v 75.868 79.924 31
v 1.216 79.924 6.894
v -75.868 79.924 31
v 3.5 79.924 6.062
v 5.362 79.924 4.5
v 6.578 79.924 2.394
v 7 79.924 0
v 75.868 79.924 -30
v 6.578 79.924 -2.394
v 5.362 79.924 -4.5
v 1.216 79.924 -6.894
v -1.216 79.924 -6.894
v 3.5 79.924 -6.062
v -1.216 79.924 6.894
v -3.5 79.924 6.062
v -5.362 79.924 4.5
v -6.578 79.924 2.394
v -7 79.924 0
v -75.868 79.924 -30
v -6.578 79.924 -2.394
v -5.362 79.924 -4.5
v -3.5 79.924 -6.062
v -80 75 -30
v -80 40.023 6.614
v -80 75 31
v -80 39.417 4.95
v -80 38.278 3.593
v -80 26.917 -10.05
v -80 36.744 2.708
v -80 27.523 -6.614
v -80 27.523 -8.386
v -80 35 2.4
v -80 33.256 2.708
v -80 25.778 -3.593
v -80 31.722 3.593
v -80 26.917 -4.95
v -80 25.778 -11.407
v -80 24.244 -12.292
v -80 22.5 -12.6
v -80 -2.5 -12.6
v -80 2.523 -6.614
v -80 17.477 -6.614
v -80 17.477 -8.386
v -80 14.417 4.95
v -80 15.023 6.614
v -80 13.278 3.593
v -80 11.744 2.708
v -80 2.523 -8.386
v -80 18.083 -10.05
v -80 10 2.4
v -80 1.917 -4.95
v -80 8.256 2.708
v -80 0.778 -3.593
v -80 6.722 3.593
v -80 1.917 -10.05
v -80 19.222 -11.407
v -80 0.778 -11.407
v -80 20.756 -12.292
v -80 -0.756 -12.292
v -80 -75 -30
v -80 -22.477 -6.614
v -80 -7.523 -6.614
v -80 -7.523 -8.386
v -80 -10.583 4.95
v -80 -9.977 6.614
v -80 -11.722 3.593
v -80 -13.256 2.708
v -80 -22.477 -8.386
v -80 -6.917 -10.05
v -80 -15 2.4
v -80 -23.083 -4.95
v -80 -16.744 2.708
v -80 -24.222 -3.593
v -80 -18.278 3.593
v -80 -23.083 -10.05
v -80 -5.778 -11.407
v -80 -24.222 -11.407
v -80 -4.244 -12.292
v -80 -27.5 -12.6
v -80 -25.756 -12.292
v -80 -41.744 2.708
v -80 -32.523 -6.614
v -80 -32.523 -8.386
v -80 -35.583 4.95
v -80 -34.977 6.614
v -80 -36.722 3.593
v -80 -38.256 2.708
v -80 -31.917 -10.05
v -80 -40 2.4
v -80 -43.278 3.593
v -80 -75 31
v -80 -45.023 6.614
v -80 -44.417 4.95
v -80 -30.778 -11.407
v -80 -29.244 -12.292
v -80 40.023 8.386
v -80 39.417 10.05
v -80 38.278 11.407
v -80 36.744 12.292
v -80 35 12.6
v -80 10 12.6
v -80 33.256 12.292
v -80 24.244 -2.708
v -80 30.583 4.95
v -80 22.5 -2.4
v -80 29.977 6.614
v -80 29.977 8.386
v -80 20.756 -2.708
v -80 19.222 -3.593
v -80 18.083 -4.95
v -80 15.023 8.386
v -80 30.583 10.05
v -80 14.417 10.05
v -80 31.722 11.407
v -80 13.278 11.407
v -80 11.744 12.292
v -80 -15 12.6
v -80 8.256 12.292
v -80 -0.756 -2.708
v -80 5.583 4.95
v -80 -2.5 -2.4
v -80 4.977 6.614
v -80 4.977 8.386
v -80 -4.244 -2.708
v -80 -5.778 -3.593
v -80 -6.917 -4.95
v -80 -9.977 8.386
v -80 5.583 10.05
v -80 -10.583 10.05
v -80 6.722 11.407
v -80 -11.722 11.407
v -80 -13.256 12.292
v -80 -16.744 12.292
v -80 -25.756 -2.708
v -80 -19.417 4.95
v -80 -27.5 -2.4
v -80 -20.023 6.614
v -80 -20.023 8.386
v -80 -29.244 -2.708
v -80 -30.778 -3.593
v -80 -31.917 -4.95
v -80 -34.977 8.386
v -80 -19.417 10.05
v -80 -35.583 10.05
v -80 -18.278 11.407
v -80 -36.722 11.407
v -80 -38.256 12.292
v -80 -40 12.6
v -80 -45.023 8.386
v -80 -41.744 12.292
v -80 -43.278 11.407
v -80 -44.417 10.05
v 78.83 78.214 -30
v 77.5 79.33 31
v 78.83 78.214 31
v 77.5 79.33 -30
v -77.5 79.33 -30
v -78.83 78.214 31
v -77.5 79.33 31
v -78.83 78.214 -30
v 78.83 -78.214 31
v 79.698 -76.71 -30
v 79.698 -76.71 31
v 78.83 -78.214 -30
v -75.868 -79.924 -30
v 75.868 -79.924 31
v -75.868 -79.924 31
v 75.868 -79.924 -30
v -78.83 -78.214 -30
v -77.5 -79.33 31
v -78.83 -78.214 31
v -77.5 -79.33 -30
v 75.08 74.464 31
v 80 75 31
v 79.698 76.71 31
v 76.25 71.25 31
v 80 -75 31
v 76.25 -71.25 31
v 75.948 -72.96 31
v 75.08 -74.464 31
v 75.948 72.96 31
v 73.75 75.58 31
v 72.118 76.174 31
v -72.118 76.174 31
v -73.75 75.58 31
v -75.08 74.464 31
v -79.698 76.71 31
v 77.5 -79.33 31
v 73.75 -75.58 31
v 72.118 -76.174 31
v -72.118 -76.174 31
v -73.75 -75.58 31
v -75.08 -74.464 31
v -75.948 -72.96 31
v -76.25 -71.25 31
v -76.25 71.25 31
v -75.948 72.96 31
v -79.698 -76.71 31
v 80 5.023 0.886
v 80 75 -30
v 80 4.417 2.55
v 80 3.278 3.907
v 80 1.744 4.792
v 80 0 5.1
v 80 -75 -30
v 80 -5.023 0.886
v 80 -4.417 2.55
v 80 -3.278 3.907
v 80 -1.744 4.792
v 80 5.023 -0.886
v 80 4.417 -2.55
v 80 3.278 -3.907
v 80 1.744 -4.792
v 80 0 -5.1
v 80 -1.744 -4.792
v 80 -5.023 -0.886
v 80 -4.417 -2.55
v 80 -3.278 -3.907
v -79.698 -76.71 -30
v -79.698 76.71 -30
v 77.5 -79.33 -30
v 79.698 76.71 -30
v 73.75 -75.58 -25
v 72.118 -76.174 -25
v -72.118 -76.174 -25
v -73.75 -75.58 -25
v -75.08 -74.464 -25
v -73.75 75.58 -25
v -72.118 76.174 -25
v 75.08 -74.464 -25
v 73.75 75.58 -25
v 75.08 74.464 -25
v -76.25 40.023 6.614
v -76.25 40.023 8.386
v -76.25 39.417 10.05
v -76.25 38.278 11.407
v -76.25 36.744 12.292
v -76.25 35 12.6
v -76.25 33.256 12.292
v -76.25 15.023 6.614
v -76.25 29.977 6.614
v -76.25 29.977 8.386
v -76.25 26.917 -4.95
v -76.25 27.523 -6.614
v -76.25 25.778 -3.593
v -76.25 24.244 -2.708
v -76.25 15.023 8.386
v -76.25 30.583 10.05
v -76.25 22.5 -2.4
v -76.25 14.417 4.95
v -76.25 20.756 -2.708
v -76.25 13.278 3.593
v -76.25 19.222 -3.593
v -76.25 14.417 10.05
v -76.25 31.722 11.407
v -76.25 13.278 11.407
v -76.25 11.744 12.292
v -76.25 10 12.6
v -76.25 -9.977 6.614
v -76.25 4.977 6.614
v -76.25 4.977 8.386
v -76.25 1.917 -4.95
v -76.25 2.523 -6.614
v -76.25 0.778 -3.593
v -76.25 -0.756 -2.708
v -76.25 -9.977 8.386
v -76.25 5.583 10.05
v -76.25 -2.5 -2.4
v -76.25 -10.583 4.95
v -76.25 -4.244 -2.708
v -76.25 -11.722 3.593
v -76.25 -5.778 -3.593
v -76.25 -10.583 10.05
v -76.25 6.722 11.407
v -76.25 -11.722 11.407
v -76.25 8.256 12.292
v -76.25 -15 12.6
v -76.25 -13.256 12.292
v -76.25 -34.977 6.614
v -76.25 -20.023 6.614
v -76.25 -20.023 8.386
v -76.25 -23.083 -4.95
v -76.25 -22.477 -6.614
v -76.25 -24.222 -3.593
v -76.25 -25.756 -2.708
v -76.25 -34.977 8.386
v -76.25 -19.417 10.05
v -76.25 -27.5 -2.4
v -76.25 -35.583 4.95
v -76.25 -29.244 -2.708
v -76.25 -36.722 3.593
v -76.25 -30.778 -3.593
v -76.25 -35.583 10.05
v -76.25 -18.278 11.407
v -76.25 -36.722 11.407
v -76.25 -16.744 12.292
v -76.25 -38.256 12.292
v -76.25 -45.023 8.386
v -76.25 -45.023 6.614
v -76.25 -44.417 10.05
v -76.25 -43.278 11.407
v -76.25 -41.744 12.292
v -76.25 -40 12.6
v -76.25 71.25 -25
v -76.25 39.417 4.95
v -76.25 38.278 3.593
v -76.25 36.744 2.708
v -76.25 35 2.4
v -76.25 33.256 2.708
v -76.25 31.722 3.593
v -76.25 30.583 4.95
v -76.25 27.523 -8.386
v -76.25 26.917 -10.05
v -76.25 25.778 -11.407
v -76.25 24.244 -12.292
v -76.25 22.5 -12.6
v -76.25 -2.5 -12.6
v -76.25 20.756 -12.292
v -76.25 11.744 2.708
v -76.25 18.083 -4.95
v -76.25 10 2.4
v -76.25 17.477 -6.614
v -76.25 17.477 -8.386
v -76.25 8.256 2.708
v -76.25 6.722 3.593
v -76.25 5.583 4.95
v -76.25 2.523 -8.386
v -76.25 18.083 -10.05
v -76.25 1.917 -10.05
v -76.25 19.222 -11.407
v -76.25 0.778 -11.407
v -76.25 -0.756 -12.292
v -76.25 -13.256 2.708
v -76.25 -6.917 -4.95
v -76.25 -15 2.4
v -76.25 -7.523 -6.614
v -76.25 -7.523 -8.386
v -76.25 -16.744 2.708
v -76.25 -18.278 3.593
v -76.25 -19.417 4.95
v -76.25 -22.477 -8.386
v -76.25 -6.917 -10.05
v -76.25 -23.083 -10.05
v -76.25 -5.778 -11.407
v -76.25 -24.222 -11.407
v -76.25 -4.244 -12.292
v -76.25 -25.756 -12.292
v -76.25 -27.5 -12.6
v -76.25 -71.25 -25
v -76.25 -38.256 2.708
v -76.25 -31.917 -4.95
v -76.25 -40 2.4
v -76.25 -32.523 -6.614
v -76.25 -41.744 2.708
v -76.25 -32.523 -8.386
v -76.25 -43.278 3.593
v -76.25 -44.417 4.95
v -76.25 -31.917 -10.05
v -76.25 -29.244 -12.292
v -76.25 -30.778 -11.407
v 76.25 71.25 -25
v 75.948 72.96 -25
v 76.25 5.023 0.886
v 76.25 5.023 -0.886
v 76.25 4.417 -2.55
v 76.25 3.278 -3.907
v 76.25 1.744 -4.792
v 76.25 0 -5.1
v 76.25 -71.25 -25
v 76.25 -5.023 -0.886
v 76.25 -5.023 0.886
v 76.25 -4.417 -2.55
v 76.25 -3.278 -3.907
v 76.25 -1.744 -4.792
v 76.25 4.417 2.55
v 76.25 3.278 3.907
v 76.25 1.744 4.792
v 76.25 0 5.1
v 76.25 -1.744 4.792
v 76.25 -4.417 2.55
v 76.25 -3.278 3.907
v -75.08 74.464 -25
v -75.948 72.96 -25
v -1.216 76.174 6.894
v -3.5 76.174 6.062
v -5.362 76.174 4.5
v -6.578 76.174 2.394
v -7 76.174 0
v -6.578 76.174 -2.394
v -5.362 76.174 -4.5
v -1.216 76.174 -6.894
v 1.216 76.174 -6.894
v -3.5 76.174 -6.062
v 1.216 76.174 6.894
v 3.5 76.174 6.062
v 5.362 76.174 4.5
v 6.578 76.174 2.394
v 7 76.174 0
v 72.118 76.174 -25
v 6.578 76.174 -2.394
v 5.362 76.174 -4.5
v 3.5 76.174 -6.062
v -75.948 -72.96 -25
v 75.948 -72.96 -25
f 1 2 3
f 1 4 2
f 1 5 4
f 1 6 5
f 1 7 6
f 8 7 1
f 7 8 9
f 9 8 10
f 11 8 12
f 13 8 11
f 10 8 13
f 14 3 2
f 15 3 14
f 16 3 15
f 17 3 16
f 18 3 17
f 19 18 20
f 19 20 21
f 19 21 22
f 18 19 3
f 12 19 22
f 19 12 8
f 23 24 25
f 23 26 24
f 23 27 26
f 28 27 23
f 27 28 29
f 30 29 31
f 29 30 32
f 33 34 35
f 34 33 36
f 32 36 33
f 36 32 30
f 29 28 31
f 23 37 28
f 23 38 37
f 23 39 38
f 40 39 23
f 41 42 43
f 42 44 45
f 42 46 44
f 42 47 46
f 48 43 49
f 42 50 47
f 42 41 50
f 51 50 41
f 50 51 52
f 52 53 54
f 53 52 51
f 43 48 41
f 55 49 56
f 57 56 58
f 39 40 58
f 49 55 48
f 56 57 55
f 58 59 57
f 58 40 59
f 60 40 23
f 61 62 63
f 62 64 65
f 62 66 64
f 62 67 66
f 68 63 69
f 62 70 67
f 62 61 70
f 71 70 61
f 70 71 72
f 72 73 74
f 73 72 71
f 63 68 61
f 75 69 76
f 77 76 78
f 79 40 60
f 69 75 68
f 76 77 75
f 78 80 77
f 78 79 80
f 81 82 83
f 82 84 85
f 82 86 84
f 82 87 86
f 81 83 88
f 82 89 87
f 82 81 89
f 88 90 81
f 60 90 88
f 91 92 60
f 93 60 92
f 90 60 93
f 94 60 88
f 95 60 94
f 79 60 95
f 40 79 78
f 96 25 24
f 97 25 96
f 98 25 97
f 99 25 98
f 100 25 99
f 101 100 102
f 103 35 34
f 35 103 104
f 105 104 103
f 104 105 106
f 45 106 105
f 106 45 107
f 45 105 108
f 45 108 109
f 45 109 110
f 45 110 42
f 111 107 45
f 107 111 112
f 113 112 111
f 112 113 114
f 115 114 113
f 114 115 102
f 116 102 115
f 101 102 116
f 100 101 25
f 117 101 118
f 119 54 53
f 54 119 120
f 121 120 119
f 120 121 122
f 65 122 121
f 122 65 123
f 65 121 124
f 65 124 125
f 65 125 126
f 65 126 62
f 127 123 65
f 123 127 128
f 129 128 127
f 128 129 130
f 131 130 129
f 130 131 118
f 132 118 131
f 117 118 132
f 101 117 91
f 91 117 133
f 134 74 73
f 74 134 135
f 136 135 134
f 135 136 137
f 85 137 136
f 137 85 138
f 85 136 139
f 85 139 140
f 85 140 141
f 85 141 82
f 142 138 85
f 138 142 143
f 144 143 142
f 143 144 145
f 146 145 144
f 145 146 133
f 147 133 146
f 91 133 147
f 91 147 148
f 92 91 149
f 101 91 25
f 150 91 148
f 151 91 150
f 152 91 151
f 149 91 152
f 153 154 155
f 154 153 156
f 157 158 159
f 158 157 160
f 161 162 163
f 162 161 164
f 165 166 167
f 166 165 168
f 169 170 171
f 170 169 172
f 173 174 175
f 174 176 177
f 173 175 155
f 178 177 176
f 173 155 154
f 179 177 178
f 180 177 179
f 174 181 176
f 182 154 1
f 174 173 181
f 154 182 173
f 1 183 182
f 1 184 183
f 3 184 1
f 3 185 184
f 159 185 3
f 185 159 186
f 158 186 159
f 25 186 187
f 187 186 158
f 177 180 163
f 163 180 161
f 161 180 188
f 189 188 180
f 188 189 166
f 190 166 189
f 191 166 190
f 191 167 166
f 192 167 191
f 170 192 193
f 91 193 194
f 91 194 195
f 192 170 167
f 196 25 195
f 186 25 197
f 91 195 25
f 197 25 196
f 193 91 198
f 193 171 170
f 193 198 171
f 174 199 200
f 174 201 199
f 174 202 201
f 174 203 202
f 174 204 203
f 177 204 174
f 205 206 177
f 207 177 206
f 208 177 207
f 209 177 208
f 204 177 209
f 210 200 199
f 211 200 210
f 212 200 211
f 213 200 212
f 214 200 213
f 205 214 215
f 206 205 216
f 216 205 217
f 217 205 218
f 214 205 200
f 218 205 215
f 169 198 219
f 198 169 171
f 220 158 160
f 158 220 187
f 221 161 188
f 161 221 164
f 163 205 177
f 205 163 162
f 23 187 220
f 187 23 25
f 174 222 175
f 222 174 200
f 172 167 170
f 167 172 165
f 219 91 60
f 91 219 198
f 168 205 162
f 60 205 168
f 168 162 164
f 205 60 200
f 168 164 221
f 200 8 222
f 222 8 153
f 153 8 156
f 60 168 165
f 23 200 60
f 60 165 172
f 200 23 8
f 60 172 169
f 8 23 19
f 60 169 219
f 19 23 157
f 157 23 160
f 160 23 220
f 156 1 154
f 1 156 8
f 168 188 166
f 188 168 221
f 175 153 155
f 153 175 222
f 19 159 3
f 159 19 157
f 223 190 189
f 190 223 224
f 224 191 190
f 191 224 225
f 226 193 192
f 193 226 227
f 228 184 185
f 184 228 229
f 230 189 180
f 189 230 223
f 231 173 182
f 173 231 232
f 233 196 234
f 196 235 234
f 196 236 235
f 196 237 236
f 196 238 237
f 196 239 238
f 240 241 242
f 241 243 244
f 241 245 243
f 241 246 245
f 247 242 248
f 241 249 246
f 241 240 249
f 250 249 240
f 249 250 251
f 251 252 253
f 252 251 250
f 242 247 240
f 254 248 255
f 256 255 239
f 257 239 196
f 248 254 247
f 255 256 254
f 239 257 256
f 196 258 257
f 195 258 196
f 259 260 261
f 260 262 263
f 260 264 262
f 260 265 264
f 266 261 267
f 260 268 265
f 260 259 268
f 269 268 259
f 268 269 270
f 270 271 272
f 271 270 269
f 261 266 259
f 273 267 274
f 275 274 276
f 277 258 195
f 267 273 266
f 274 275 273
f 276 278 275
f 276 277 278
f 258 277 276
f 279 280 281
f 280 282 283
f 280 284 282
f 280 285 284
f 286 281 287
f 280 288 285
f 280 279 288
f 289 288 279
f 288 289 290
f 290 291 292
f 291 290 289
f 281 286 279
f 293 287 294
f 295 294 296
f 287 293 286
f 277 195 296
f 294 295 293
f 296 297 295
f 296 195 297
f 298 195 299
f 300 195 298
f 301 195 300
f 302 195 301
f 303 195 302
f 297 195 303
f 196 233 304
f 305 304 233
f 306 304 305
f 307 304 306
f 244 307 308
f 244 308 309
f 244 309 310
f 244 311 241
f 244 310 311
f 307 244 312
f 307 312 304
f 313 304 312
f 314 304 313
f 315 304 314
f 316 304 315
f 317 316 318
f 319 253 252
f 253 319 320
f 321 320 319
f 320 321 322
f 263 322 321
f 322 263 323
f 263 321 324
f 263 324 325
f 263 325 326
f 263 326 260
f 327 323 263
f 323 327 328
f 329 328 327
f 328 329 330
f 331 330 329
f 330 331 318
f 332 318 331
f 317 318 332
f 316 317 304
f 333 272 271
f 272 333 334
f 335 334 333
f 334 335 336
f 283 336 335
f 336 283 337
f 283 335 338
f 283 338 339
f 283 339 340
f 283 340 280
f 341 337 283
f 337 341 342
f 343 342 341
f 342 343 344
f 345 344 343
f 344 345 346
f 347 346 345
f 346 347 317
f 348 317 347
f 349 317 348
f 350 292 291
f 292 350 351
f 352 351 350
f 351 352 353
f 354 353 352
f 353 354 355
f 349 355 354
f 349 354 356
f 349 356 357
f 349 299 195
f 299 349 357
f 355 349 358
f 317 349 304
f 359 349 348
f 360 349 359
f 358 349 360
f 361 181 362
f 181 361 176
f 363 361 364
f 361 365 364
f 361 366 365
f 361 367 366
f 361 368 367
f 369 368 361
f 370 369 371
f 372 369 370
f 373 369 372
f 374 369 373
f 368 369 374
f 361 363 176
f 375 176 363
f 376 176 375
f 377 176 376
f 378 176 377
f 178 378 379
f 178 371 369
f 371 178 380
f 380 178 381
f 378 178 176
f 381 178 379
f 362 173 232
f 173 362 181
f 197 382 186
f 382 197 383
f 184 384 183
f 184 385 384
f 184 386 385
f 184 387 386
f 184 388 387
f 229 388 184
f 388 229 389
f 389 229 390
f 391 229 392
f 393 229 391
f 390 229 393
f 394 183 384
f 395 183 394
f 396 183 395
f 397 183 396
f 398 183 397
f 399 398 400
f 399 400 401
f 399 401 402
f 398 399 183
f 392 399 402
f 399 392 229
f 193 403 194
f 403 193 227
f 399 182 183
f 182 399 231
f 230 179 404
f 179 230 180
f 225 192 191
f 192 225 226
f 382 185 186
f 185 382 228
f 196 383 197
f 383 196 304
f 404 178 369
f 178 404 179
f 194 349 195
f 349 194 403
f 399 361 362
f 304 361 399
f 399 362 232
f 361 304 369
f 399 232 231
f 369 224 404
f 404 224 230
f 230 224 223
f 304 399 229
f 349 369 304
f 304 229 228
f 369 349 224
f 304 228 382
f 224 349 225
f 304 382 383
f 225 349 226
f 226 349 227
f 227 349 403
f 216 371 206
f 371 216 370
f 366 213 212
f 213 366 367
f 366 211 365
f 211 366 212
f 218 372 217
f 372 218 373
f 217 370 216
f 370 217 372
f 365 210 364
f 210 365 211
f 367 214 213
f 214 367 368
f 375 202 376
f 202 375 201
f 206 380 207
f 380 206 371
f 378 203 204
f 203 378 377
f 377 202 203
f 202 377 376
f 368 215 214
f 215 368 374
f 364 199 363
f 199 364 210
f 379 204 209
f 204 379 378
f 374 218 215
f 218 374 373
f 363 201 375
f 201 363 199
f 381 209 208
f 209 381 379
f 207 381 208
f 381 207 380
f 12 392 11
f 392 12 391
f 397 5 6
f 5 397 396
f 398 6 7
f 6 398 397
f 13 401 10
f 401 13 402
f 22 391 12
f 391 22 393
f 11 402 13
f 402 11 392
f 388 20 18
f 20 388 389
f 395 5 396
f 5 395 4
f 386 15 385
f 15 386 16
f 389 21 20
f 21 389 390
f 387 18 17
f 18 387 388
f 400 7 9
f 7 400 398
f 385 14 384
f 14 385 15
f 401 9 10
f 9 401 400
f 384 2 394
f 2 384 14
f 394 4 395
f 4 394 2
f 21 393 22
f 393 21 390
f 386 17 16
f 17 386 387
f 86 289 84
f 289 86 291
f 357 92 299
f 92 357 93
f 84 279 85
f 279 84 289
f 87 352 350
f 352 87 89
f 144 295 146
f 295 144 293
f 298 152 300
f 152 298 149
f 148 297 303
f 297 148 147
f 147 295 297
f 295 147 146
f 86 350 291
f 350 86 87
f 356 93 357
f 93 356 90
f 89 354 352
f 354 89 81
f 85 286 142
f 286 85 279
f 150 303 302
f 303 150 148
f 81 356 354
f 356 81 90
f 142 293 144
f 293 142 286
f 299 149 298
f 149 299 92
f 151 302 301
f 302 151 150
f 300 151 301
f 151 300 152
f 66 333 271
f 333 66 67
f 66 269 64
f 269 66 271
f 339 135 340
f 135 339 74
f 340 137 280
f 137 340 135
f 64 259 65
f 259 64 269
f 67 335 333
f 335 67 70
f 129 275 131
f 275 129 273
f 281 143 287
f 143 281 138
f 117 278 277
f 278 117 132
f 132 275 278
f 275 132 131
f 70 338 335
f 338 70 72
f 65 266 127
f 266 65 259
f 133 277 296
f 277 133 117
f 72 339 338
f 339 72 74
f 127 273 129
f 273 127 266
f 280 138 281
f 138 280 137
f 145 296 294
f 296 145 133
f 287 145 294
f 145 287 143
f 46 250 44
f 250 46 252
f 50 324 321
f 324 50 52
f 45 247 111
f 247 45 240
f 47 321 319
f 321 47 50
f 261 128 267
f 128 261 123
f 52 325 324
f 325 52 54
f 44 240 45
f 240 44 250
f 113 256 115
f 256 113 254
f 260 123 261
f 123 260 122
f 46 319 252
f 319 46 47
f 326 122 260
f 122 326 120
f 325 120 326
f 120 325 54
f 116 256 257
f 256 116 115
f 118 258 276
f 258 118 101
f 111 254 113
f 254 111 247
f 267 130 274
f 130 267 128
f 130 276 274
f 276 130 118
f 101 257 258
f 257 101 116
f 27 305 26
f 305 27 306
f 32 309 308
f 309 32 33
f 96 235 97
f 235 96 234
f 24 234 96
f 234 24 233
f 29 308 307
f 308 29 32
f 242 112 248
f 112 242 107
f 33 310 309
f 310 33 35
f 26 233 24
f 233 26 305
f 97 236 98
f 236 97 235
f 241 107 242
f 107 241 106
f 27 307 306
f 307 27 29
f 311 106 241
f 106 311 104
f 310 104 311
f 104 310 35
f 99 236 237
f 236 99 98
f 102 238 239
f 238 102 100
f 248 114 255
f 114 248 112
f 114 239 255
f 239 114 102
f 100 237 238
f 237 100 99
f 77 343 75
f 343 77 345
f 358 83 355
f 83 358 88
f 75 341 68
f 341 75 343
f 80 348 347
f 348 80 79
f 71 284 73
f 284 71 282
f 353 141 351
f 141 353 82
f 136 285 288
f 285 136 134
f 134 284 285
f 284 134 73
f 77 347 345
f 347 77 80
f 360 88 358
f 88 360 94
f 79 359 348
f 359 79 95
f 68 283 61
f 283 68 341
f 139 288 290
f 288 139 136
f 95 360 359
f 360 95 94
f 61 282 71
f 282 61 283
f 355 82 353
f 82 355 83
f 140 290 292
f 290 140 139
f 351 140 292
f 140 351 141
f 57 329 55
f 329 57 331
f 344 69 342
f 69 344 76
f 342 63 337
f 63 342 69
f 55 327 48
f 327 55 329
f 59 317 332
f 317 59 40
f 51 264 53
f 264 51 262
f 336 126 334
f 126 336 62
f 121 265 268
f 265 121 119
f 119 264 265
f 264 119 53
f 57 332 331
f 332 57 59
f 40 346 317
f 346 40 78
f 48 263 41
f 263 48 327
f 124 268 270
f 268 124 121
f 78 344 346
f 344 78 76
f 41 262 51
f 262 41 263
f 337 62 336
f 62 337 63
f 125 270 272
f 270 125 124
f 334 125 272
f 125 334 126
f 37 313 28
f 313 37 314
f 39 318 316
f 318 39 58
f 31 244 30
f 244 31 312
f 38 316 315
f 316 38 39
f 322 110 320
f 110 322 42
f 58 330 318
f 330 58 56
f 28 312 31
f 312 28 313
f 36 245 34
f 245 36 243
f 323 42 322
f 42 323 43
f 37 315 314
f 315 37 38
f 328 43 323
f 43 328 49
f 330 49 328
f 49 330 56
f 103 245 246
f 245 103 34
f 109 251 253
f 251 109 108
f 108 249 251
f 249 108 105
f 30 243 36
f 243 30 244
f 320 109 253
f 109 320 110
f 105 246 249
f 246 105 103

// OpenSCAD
$fn=18;

// Messbox
mbL = 150; // Länge
mbB = 150; // Breite 
mbH = 60; // Höhe

// Radien
rm12 = 5.1; // M12
rm16 = 7; // M16

// Ecken
cr0 = 5;


difference()
{
    // Box
    minkowski()
    {
        cube([mbL,mbB,mbH], center = true);
        cylinder(r = cr0, h = 1);
    }
    // Ausschnitt
    translate([0,0,2.5])
    minkowski()
    {
        cube([mbL-7.5,mbB-7.5,mbH-5], center = true);
        cylinder(r = cr0, h = 1);
    }
    // M12 Ausschnitt
    translate([mbL/2, 0, 0])rotate([0,90,0])cylinder(r = rm12, h = 10);
    // M16 Ausschnitt
    translate([0, mbB/2+5, 0])rotate([90,0,0])cylinder(r = rm16, h = 10);
    // 7 * M12 Ausschnitt
    // 4 * oben Höhe = 37.5
    translate([-mbL/2-5,-40,7.5])rotate([0,90,0])cylinder(r = rm12, h = 10);
    translate([-mbL/2-5,-15,7.5])rotate([0,90,0])cylinder(r = rm12, h = 10);
    translate([-mbL/2-5,10,7.5])rotate([0,90,0])cylinder(r = rm12, h = 10);
    translate([-mbL/2-5,35,7.5])rotate([0,90,0])cylinder(r = rm12, h = 10);
    // 3 * unten Höhe = 22.5
    translate([-mbL/2-5,-27.5,-7.5])rotate([0,90,0])cylinder(r = rm12, h = 10);
    translate([-mbL/2-5,-2.5,-7.5])rotate([0,90,0])cylinder(r = rm12, h = 10);
    translate([-mbL/2-5,22.5,-7.5])rotate([0,90,0])cylinder(r = rm12, h = 10);
}
